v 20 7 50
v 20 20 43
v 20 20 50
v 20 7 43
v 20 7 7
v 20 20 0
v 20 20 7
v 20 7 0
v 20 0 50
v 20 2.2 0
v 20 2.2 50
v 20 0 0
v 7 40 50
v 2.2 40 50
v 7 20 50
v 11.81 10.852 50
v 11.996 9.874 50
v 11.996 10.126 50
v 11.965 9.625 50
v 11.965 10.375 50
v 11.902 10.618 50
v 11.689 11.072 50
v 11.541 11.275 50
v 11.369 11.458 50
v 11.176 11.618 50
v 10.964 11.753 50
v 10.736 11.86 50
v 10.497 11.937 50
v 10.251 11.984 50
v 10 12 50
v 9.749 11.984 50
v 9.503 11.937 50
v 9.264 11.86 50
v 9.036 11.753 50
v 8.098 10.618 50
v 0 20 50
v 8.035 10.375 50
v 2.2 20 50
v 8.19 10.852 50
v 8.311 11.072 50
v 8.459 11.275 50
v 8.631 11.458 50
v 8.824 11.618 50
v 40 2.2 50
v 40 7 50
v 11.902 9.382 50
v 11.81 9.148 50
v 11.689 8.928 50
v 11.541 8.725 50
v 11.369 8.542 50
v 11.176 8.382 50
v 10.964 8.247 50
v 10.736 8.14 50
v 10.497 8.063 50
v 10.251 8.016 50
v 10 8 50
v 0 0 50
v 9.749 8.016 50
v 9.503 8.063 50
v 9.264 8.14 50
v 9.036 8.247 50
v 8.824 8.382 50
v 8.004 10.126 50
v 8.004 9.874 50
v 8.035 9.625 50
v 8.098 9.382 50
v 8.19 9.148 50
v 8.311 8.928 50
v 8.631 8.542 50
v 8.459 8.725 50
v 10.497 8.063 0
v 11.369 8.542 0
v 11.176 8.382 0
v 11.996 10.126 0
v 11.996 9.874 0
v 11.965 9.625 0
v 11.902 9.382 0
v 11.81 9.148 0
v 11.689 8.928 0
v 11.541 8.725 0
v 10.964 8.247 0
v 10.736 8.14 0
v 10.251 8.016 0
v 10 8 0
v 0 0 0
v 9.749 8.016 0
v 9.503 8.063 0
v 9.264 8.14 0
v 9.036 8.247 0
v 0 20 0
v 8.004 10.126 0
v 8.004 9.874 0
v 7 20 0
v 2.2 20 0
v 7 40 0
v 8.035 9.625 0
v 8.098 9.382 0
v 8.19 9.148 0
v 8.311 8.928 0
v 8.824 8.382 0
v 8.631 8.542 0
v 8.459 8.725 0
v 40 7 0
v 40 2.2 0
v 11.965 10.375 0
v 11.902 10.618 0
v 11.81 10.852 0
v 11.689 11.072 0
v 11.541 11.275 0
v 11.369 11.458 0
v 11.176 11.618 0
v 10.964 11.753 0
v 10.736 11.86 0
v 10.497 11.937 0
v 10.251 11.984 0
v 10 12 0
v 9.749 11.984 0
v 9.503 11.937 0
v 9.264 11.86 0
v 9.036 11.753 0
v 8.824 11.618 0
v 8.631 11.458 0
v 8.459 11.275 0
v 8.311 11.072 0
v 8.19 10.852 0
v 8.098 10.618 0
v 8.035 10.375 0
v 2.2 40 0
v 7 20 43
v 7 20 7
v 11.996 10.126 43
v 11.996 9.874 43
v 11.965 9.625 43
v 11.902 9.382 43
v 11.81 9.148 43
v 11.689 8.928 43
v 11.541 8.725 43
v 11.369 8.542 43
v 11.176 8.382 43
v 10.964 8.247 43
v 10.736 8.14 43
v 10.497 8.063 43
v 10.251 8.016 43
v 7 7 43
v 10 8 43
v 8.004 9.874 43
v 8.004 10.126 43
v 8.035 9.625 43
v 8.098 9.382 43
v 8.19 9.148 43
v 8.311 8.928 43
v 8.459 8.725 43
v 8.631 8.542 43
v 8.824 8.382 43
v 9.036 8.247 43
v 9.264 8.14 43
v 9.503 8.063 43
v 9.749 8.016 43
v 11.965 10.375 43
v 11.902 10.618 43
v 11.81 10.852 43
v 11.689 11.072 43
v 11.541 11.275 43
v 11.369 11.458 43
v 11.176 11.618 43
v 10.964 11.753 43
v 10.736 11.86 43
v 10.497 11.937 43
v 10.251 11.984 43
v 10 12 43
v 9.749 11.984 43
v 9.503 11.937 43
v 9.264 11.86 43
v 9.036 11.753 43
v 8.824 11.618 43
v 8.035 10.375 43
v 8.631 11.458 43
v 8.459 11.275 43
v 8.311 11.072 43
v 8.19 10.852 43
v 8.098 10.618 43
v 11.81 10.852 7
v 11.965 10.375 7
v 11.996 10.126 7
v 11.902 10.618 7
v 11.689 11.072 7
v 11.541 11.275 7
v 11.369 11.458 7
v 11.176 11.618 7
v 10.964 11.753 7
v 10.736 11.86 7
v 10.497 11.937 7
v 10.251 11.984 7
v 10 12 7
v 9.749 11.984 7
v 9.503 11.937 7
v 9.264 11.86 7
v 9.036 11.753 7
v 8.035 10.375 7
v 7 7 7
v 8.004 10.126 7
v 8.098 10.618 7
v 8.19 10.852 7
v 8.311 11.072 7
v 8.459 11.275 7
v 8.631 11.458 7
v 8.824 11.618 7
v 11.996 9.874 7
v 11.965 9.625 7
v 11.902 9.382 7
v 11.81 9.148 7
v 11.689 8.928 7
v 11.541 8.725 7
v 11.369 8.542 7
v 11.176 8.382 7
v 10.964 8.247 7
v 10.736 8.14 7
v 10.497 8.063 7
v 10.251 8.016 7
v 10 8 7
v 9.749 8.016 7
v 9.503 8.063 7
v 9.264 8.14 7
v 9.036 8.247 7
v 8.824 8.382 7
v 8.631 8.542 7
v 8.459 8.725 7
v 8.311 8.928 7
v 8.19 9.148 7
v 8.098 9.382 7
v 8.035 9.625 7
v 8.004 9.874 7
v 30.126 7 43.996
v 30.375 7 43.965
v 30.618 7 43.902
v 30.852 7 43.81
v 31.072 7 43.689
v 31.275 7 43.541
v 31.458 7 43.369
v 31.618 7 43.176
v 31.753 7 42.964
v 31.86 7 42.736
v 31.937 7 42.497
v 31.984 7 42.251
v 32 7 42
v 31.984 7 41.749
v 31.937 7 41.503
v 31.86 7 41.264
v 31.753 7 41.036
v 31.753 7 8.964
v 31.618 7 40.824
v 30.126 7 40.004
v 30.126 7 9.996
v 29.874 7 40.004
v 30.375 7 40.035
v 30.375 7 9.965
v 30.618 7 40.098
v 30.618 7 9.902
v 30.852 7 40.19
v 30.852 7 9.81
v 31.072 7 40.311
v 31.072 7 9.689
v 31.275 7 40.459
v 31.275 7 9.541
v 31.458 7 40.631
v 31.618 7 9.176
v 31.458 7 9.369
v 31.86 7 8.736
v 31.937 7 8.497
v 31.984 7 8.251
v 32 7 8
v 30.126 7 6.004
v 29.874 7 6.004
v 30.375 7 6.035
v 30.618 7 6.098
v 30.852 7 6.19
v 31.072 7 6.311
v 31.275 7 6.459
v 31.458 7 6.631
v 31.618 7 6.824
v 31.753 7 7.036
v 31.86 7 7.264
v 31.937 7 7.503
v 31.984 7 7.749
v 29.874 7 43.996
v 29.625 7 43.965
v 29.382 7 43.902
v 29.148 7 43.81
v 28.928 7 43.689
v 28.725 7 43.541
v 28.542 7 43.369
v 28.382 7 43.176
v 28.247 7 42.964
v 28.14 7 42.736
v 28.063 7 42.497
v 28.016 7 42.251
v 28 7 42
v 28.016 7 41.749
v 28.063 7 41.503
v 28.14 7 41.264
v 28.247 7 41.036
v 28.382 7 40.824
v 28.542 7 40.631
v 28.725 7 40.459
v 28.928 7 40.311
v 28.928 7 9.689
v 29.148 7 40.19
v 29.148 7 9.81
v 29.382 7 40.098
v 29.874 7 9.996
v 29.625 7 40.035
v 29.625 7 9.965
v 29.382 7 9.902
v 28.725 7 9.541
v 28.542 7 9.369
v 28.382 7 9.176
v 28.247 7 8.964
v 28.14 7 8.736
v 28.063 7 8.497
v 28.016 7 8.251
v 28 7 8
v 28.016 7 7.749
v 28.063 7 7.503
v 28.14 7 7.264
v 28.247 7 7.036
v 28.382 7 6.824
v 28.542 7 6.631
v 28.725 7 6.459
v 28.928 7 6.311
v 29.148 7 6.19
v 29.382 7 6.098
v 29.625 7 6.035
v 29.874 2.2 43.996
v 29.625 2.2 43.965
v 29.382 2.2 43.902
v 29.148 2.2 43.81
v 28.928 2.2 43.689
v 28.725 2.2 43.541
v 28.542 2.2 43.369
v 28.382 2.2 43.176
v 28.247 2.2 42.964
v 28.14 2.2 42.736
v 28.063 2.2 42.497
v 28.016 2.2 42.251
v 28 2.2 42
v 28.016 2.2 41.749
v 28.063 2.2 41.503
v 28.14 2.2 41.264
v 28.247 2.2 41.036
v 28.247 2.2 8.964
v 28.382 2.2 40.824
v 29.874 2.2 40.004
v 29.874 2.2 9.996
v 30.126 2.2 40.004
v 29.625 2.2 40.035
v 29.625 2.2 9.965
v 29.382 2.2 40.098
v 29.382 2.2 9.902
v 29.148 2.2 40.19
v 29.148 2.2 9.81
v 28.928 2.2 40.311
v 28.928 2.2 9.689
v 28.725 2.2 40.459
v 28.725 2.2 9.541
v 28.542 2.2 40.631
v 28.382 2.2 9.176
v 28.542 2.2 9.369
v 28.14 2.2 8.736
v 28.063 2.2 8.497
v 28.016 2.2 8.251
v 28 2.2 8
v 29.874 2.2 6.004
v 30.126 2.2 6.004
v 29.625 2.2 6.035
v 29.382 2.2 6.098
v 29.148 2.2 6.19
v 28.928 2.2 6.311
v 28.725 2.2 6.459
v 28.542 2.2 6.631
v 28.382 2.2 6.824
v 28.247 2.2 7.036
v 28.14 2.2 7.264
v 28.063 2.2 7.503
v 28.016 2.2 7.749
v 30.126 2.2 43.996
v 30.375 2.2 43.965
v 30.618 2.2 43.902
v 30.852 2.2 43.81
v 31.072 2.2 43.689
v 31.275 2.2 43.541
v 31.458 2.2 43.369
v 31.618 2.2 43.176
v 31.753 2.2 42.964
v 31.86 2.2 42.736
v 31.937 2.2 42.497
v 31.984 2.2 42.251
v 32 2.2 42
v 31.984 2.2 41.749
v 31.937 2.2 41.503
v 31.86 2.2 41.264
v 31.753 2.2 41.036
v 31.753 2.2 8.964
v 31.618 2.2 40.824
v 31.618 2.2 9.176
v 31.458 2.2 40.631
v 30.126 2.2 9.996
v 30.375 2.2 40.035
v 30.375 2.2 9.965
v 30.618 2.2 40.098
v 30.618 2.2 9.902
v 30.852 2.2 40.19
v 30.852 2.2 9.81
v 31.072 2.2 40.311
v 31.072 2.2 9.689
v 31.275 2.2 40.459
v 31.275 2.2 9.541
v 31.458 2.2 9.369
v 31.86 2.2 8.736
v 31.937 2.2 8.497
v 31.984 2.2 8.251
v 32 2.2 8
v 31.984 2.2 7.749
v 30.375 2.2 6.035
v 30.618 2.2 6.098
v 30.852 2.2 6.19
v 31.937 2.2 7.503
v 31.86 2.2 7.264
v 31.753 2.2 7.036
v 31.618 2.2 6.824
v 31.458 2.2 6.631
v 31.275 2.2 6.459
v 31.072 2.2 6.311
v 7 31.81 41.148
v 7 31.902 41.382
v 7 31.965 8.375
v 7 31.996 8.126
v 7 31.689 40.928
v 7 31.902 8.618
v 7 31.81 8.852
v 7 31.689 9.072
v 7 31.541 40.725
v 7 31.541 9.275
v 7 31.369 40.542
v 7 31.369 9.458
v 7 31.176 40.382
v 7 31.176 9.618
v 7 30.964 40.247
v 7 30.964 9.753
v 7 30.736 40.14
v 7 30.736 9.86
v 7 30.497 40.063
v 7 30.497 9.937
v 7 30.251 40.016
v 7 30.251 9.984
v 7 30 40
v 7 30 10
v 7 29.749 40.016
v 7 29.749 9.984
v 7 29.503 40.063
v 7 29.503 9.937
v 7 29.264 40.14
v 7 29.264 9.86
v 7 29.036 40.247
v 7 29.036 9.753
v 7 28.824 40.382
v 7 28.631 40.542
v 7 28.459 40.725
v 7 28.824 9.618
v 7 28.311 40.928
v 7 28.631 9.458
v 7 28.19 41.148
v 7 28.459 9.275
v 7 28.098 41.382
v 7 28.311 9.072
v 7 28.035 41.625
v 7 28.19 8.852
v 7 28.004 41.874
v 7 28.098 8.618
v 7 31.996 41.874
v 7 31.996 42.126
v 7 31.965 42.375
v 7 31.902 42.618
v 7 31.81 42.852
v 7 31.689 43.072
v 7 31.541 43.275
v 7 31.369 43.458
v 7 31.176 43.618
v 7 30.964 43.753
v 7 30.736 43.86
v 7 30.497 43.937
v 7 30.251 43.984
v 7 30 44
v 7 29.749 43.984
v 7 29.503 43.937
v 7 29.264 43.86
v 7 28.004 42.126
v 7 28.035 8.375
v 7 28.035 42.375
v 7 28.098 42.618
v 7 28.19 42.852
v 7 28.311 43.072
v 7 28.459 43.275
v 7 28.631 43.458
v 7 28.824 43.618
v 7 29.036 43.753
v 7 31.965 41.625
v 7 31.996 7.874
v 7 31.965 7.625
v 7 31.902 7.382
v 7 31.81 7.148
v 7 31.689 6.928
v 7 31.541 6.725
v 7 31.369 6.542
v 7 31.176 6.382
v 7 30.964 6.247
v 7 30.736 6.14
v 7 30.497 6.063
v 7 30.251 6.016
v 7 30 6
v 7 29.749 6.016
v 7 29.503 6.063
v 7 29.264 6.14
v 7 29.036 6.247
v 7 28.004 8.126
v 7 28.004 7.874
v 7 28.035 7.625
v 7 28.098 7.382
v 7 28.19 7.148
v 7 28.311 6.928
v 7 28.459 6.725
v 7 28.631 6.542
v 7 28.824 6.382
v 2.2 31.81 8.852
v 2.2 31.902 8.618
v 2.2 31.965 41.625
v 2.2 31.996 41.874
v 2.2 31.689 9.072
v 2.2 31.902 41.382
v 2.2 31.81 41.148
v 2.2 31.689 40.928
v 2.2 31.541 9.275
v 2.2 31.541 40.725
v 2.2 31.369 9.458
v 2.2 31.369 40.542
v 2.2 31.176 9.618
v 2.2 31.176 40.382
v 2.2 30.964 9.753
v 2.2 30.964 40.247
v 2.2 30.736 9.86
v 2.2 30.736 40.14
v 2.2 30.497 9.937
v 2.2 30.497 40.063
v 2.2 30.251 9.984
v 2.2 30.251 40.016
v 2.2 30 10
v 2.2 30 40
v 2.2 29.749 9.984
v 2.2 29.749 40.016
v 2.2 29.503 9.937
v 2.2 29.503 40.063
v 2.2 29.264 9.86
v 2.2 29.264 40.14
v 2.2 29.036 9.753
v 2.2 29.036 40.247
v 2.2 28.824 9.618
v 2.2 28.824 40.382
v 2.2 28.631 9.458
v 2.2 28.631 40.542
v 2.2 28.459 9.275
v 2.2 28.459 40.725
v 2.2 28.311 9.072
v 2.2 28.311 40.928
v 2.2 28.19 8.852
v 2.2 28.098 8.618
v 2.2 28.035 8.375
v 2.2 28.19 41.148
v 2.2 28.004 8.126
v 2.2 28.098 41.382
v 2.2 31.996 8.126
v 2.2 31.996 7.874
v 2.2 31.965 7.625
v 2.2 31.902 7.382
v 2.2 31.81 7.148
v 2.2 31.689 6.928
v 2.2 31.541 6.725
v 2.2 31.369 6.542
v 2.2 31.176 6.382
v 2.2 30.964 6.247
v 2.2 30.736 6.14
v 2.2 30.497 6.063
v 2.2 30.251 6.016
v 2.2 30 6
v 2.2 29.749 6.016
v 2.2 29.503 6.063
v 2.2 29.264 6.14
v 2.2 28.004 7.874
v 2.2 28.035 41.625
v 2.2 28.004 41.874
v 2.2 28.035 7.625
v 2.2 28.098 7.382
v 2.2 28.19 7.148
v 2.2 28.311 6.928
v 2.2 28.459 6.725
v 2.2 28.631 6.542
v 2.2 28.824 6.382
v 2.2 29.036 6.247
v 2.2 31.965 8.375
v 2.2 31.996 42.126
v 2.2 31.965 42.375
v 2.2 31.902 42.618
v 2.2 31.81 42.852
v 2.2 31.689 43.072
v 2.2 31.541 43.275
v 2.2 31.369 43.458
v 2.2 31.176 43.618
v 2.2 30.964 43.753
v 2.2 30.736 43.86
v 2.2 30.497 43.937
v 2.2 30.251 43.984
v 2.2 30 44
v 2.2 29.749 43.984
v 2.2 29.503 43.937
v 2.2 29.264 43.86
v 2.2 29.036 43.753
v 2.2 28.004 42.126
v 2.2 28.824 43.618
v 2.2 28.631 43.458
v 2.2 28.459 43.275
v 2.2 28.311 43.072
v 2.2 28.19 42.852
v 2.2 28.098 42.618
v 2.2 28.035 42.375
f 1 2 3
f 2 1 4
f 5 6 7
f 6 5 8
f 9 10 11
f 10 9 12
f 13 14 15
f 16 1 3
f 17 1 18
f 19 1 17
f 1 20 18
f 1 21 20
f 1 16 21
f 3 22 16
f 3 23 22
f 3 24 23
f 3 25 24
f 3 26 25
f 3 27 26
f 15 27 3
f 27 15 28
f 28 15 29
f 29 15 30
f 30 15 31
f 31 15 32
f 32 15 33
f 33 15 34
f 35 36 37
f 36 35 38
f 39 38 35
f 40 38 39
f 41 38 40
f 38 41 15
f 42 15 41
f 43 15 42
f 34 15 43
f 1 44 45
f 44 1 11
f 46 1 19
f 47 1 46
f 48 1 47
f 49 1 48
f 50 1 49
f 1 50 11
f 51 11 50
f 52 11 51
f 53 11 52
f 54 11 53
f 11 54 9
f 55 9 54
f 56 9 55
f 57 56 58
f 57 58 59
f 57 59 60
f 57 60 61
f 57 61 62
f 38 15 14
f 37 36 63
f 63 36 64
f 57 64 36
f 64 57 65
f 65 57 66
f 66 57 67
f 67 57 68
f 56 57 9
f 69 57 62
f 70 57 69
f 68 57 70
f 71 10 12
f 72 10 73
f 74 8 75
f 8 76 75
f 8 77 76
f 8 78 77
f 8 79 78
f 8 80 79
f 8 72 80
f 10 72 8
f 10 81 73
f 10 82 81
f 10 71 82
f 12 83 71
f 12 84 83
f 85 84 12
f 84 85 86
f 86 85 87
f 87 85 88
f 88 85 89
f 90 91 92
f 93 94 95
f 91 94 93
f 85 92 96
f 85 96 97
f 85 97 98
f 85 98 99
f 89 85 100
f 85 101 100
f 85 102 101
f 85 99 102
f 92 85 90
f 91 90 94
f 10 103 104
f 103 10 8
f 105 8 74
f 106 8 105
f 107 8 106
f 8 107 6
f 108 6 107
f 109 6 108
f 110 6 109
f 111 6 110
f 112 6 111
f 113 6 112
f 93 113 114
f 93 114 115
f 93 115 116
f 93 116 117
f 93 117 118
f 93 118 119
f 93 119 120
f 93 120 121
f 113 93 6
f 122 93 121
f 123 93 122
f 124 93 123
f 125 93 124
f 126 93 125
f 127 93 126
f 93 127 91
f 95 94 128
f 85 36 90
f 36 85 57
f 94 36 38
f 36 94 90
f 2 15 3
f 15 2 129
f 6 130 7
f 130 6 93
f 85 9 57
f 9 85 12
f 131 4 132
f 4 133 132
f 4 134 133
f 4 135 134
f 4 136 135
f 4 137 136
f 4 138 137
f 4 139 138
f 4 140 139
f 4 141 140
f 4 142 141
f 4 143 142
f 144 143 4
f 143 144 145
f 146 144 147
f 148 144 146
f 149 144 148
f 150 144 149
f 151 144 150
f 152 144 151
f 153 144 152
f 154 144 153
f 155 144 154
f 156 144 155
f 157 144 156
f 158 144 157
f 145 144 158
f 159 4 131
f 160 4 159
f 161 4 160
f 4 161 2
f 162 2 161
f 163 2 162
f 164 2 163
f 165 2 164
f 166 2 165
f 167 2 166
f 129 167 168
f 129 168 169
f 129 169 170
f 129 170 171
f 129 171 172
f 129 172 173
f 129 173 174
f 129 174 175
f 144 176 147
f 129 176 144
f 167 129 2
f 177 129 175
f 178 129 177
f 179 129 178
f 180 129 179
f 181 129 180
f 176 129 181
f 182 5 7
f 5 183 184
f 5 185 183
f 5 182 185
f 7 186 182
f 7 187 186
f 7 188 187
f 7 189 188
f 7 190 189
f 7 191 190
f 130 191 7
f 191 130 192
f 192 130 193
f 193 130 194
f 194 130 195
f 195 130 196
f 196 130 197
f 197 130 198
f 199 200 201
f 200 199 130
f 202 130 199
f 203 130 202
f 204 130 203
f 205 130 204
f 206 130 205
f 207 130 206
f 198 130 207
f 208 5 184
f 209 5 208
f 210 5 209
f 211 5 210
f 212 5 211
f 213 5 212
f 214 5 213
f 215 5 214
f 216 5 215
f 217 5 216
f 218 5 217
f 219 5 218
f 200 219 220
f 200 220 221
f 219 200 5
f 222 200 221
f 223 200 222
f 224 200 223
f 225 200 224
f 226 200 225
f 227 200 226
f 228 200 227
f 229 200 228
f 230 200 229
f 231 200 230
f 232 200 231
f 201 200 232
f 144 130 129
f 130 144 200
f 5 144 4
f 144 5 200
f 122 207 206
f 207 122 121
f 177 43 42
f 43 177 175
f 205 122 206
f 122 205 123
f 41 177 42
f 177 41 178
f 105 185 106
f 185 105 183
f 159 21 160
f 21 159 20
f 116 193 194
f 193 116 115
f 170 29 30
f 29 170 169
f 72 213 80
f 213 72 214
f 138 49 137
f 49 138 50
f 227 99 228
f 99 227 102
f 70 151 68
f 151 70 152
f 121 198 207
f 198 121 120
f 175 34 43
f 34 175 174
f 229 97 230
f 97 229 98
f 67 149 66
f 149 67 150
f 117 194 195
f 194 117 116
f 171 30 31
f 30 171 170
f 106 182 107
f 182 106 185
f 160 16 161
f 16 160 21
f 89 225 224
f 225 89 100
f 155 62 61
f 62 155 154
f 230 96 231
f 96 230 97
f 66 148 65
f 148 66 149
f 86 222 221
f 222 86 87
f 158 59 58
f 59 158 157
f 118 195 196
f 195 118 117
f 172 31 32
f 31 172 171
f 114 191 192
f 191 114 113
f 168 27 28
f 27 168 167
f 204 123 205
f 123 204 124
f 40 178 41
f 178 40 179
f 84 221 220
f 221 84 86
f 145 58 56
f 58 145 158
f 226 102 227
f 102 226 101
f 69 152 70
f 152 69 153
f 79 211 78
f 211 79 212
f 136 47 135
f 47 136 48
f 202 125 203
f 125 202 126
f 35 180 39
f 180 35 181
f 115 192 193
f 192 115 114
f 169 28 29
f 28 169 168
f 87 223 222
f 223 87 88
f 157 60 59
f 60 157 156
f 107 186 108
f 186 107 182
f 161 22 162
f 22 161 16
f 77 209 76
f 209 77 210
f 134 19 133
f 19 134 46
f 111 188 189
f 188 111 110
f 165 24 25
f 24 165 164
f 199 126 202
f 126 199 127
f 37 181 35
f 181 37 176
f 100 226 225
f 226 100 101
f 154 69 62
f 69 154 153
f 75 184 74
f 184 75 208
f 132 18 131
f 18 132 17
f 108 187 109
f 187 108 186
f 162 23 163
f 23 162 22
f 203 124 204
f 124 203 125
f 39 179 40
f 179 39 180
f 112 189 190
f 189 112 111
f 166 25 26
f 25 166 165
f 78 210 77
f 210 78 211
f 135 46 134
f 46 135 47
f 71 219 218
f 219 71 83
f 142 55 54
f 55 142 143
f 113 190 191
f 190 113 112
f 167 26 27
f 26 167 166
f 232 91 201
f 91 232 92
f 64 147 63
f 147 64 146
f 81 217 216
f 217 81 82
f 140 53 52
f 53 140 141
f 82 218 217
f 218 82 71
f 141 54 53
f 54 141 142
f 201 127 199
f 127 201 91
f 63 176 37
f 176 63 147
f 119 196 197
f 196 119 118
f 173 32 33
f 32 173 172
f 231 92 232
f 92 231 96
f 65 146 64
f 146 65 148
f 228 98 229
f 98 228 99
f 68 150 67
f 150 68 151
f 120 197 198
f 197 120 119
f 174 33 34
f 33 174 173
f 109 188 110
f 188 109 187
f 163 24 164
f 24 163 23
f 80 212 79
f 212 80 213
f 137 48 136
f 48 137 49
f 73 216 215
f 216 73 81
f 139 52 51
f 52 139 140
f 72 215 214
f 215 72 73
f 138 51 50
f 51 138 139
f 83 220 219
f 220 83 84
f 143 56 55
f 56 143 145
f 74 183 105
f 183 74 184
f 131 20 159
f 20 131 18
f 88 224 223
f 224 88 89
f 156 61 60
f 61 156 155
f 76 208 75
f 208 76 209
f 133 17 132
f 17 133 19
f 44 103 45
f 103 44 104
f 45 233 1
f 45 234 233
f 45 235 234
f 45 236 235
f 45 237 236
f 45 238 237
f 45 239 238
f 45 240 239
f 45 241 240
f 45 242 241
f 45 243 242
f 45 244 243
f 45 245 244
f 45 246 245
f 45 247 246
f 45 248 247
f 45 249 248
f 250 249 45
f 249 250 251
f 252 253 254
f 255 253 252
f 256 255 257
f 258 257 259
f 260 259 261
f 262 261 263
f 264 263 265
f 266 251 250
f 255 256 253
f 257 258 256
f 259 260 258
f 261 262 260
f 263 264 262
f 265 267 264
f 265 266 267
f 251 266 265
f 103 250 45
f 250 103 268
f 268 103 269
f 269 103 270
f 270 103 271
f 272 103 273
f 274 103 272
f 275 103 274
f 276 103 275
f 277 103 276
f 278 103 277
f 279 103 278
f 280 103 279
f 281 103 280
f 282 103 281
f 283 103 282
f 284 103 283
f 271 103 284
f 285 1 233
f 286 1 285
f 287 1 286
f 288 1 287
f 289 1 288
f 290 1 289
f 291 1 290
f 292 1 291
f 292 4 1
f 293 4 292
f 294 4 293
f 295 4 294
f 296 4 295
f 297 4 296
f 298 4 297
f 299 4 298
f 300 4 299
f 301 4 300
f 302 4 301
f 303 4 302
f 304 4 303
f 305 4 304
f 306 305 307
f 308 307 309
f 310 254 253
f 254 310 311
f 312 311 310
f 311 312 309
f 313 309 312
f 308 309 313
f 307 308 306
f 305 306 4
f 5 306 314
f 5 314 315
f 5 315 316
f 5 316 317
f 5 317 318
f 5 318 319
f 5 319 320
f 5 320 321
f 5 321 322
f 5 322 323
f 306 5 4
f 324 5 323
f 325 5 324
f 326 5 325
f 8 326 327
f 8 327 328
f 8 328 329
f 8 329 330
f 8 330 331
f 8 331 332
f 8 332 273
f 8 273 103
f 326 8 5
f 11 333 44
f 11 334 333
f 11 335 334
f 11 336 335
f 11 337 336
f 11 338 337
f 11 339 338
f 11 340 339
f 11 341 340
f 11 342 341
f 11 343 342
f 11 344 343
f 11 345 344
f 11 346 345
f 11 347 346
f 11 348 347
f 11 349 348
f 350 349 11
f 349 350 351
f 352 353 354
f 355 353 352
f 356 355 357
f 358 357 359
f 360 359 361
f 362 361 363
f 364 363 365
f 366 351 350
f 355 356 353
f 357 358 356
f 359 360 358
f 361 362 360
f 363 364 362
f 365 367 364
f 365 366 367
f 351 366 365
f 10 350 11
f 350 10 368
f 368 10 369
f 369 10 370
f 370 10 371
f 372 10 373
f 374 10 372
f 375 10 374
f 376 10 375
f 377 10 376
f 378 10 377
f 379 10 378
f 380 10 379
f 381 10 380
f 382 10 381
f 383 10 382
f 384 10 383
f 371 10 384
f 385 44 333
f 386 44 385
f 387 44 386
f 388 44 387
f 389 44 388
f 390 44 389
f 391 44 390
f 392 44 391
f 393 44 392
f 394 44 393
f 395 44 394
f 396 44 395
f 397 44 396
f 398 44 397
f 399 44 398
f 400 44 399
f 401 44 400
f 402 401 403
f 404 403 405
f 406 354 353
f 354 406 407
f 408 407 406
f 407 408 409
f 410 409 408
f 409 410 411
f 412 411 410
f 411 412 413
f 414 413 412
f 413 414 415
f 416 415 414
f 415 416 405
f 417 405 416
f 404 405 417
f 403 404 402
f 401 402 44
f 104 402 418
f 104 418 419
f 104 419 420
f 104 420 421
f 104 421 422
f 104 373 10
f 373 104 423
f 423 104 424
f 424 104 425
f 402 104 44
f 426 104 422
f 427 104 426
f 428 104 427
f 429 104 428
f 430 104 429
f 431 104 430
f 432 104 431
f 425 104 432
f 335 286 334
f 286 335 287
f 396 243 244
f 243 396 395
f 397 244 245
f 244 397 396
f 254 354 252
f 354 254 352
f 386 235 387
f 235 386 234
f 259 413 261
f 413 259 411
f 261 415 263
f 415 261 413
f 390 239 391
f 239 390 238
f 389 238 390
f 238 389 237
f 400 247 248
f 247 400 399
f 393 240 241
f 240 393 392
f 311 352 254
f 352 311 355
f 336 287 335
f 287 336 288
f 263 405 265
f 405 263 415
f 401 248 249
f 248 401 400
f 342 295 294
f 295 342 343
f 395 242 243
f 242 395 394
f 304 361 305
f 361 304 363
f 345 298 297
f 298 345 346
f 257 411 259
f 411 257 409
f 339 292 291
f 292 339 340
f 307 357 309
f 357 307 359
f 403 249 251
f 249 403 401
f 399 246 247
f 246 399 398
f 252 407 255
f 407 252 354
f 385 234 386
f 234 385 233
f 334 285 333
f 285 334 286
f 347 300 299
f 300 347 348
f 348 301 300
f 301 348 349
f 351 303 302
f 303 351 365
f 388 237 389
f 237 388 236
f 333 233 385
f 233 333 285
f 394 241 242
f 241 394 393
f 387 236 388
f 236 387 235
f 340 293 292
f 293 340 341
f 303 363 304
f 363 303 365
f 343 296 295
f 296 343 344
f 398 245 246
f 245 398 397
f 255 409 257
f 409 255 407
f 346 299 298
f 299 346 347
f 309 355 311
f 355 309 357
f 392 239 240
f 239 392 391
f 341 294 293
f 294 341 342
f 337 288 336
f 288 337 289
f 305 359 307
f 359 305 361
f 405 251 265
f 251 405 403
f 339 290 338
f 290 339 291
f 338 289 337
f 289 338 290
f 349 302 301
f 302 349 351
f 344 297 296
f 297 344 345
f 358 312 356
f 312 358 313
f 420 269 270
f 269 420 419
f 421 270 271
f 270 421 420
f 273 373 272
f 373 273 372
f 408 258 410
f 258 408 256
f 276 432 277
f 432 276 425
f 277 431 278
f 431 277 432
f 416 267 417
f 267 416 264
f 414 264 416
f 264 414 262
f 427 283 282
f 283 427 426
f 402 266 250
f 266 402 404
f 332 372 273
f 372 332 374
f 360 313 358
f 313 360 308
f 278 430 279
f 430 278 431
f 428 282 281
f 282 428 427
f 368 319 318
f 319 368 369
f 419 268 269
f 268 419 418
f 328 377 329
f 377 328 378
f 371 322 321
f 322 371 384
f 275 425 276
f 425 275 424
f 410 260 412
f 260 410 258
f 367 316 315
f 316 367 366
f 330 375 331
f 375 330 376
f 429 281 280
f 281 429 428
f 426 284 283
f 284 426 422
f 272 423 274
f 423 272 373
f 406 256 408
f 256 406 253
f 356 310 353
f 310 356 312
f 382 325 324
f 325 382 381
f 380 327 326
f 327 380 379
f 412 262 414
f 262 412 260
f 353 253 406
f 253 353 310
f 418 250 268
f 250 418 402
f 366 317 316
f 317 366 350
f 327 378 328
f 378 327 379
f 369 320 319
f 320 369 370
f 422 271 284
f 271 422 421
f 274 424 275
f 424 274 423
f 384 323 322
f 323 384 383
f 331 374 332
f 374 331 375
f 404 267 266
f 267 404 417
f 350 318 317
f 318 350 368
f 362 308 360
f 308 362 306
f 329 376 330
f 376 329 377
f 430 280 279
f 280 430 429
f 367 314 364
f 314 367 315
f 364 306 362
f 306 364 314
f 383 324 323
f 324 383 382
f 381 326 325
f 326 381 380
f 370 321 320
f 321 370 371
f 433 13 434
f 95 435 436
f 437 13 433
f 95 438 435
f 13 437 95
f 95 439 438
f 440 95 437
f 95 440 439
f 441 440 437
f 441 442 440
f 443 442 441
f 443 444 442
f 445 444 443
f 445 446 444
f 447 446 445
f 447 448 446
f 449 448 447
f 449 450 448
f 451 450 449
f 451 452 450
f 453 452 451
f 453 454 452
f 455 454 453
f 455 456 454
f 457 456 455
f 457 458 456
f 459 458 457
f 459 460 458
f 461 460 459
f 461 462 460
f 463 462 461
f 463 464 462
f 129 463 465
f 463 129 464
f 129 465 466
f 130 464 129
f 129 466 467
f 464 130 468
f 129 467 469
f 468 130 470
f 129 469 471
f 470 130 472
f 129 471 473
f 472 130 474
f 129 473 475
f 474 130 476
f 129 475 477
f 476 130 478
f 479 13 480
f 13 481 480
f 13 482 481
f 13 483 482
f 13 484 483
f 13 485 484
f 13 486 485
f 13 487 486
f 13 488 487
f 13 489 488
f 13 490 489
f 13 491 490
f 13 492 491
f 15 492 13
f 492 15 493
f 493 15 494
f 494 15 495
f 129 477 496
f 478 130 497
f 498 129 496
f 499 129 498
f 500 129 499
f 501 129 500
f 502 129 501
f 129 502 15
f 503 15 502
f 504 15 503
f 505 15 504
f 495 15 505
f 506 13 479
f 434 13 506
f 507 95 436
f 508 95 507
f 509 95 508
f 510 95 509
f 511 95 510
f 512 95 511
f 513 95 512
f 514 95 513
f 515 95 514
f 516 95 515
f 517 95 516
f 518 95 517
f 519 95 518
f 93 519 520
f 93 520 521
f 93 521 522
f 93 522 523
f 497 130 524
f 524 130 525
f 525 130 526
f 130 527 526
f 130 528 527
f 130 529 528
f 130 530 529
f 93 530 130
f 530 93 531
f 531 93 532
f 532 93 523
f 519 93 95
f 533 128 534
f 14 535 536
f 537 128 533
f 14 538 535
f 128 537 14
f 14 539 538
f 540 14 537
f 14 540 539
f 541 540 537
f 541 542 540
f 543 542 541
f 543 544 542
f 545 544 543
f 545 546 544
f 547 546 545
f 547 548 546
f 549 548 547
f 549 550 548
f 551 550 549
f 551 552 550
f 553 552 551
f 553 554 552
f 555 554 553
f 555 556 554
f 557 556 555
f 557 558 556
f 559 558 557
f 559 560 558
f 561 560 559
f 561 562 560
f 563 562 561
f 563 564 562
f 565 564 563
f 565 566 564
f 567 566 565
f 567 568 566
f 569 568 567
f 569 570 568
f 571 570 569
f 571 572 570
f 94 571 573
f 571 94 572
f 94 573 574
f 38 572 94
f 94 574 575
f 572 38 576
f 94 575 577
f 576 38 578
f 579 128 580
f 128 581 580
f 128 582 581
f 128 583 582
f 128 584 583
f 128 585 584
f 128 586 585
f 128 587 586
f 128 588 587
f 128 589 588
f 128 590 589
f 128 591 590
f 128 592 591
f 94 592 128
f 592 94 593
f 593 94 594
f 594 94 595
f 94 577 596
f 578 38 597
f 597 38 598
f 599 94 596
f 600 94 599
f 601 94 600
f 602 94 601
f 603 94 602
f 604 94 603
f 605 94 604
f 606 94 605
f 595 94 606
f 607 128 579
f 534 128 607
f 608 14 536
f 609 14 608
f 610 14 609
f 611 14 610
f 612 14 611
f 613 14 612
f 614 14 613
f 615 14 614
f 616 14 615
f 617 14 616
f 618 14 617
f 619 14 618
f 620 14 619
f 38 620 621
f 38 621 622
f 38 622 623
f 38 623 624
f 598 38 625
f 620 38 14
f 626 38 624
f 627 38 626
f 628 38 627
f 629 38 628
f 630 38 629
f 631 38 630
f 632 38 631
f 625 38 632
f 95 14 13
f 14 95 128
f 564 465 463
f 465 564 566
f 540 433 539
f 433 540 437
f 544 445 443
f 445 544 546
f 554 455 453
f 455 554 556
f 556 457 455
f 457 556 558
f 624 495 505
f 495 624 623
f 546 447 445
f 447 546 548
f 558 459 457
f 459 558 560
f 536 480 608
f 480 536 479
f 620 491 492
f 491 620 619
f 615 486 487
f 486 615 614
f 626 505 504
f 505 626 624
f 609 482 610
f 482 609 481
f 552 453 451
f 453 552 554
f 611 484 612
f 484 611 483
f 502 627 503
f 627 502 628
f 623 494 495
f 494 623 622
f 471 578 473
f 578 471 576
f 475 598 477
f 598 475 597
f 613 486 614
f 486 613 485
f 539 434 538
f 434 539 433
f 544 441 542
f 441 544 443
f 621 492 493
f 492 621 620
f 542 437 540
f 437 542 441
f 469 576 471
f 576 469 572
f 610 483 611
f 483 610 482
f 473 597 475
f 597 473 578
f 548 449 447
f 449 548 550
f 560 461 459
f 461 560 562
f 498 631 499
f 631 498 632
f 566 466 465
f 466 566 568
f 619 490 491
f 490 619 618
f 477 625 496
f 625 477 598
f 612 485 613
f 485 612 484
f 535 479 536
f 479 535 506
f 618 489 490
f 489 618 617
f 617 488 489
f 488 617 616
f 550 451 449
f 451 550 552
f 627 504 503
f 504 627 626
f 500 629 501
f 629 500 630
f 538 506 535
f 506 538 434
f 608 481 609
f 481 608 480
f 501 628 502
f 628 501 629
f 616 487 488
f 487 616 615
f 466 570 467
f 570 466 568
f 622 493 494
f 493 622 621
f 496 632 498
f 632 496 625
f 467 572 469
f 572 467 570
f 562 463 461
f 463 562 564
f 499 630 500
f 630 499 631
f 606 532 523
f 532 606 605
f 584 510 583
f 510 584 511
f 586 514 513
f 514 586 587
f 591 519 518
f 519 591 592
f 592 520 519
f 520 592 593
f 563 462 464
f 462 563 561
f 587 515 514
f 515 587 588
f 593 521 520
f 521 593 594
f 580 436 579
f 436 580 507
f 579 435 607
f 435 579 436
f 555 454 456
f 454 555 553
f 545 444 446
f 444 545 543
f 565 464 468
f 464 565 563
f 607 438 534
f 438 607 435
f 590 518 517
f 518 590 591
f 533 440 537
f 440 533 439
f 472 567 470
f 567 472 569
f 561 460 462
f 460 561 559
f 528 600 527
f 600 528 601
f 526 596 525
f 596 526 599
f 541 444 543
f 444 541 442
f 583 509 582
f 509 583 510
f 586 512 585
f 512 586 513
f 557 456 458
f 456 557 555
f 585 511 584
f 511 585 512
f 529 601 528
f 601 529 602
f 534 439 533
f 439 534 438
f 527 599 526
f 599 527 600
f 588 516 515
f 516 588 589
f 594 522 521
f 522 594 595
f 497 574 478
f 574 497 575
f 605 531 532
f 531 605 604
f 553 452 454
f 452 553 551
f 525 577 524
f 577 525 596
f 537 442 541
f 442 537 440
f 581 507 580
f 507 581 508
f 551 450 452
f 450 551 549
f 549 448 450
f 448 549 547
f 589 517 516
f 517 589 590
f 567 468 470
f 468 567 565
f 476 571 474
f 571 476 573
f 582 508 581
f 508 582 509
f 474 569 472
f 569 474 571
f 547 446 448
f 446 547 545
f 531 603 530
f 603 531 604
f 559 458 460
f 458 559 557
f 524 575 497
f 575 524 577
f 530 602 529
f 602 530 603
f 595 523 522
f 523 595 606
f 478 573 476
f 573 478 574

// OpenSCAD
/*
** Corner part for box
**
** Licence Creative commens : CC-BY
** By : Dave Borghuis
** Email : dave@daveborghuis.nl
** Project page (work in progress) : https://tkkrlab.nl/wiki/Arcade_RetroPie
**  
*/

// preview[view:north, tilt:top]

/* [Corner Bracket] */
//Size of corner block in mm
$size = 20;
//Wall thickness
$wall = 7;
//Hight in mm
$hight = 50; 
//Solid block
$hight = 50; 

/* [Advanced options] */
//Diameter for screw in mm
$screw_diameter = 4;
//thickness of plate in mm (keep wall thickness in mind)
$plate = 2.2; 
//Solid cube (without overhang)
inner_cube = true; // [true:Small,false:Medium]

/* [Hidden] */
//distanse from nearest edge in mm
$screwdistance = 8; 
//Size of overlap in mm
$plateLengt = 20; 
//calculations are done radius, convert diameter to radius.
$screwsize = $screw_diameter/2;

union() {
    //main corner
    difference() {
        cube([$size,$size,$hight]); //outer
        if (inner_cube) translate ([$wall,$wall,$wall]) {
            cube([$size+$plateLengt,$size+$plateLengt,$hight-(2*$wall)]); //inner
        }
        //top and bottom screw
        translate ([$size/2,$size/2,$hight]) rotate ([0,0,90]) cylinder (h = 2*$hight , r=$screwsize, center = true, $fn=50); 
    }

    //Side plates
    difference() {
        //left plate
        translate ([$size,$plate,0]) {
            cube([$plateLengt,$wall-$plate,$hight]) color([255,0,0]); //inner
        }
        //screws
        translate ([$size+$plateLengt/2,$wall,$hight-$screwdistance]) rotate ([90,0,0]) cylinder (h = 2*$wall , r=$screwsize, center = true, $fn=50);
        translate ([$size+$plateLengt/2,$wall,$screwdistance]) rotate ([90,0,0]) cylinder (h = 2*$wall , r=$screwsize, center = true, $fn=50);
    }
    
    difference() {    
        //right plate
        translate ([$plate,$size,0]) {
            cube([$wall-$plate,$plateLengt,$hight]) color([255,0,0]); //inner
        }
        //screws
        translate ([$wall,$size+$plateLengt/2,$hight-$screwdistance]) rotate ([0,90,0]) cylinder (h = 2*$wall , r=$screwsize, center = true, $fn=50);
        translate ([$wall,$size+$plateLengt/2,$screwdistance]) rotate ([0,90,0]) cylinder (h = 2*$wall , r=$screwsize, center = true, $fn=50);
    }
}
